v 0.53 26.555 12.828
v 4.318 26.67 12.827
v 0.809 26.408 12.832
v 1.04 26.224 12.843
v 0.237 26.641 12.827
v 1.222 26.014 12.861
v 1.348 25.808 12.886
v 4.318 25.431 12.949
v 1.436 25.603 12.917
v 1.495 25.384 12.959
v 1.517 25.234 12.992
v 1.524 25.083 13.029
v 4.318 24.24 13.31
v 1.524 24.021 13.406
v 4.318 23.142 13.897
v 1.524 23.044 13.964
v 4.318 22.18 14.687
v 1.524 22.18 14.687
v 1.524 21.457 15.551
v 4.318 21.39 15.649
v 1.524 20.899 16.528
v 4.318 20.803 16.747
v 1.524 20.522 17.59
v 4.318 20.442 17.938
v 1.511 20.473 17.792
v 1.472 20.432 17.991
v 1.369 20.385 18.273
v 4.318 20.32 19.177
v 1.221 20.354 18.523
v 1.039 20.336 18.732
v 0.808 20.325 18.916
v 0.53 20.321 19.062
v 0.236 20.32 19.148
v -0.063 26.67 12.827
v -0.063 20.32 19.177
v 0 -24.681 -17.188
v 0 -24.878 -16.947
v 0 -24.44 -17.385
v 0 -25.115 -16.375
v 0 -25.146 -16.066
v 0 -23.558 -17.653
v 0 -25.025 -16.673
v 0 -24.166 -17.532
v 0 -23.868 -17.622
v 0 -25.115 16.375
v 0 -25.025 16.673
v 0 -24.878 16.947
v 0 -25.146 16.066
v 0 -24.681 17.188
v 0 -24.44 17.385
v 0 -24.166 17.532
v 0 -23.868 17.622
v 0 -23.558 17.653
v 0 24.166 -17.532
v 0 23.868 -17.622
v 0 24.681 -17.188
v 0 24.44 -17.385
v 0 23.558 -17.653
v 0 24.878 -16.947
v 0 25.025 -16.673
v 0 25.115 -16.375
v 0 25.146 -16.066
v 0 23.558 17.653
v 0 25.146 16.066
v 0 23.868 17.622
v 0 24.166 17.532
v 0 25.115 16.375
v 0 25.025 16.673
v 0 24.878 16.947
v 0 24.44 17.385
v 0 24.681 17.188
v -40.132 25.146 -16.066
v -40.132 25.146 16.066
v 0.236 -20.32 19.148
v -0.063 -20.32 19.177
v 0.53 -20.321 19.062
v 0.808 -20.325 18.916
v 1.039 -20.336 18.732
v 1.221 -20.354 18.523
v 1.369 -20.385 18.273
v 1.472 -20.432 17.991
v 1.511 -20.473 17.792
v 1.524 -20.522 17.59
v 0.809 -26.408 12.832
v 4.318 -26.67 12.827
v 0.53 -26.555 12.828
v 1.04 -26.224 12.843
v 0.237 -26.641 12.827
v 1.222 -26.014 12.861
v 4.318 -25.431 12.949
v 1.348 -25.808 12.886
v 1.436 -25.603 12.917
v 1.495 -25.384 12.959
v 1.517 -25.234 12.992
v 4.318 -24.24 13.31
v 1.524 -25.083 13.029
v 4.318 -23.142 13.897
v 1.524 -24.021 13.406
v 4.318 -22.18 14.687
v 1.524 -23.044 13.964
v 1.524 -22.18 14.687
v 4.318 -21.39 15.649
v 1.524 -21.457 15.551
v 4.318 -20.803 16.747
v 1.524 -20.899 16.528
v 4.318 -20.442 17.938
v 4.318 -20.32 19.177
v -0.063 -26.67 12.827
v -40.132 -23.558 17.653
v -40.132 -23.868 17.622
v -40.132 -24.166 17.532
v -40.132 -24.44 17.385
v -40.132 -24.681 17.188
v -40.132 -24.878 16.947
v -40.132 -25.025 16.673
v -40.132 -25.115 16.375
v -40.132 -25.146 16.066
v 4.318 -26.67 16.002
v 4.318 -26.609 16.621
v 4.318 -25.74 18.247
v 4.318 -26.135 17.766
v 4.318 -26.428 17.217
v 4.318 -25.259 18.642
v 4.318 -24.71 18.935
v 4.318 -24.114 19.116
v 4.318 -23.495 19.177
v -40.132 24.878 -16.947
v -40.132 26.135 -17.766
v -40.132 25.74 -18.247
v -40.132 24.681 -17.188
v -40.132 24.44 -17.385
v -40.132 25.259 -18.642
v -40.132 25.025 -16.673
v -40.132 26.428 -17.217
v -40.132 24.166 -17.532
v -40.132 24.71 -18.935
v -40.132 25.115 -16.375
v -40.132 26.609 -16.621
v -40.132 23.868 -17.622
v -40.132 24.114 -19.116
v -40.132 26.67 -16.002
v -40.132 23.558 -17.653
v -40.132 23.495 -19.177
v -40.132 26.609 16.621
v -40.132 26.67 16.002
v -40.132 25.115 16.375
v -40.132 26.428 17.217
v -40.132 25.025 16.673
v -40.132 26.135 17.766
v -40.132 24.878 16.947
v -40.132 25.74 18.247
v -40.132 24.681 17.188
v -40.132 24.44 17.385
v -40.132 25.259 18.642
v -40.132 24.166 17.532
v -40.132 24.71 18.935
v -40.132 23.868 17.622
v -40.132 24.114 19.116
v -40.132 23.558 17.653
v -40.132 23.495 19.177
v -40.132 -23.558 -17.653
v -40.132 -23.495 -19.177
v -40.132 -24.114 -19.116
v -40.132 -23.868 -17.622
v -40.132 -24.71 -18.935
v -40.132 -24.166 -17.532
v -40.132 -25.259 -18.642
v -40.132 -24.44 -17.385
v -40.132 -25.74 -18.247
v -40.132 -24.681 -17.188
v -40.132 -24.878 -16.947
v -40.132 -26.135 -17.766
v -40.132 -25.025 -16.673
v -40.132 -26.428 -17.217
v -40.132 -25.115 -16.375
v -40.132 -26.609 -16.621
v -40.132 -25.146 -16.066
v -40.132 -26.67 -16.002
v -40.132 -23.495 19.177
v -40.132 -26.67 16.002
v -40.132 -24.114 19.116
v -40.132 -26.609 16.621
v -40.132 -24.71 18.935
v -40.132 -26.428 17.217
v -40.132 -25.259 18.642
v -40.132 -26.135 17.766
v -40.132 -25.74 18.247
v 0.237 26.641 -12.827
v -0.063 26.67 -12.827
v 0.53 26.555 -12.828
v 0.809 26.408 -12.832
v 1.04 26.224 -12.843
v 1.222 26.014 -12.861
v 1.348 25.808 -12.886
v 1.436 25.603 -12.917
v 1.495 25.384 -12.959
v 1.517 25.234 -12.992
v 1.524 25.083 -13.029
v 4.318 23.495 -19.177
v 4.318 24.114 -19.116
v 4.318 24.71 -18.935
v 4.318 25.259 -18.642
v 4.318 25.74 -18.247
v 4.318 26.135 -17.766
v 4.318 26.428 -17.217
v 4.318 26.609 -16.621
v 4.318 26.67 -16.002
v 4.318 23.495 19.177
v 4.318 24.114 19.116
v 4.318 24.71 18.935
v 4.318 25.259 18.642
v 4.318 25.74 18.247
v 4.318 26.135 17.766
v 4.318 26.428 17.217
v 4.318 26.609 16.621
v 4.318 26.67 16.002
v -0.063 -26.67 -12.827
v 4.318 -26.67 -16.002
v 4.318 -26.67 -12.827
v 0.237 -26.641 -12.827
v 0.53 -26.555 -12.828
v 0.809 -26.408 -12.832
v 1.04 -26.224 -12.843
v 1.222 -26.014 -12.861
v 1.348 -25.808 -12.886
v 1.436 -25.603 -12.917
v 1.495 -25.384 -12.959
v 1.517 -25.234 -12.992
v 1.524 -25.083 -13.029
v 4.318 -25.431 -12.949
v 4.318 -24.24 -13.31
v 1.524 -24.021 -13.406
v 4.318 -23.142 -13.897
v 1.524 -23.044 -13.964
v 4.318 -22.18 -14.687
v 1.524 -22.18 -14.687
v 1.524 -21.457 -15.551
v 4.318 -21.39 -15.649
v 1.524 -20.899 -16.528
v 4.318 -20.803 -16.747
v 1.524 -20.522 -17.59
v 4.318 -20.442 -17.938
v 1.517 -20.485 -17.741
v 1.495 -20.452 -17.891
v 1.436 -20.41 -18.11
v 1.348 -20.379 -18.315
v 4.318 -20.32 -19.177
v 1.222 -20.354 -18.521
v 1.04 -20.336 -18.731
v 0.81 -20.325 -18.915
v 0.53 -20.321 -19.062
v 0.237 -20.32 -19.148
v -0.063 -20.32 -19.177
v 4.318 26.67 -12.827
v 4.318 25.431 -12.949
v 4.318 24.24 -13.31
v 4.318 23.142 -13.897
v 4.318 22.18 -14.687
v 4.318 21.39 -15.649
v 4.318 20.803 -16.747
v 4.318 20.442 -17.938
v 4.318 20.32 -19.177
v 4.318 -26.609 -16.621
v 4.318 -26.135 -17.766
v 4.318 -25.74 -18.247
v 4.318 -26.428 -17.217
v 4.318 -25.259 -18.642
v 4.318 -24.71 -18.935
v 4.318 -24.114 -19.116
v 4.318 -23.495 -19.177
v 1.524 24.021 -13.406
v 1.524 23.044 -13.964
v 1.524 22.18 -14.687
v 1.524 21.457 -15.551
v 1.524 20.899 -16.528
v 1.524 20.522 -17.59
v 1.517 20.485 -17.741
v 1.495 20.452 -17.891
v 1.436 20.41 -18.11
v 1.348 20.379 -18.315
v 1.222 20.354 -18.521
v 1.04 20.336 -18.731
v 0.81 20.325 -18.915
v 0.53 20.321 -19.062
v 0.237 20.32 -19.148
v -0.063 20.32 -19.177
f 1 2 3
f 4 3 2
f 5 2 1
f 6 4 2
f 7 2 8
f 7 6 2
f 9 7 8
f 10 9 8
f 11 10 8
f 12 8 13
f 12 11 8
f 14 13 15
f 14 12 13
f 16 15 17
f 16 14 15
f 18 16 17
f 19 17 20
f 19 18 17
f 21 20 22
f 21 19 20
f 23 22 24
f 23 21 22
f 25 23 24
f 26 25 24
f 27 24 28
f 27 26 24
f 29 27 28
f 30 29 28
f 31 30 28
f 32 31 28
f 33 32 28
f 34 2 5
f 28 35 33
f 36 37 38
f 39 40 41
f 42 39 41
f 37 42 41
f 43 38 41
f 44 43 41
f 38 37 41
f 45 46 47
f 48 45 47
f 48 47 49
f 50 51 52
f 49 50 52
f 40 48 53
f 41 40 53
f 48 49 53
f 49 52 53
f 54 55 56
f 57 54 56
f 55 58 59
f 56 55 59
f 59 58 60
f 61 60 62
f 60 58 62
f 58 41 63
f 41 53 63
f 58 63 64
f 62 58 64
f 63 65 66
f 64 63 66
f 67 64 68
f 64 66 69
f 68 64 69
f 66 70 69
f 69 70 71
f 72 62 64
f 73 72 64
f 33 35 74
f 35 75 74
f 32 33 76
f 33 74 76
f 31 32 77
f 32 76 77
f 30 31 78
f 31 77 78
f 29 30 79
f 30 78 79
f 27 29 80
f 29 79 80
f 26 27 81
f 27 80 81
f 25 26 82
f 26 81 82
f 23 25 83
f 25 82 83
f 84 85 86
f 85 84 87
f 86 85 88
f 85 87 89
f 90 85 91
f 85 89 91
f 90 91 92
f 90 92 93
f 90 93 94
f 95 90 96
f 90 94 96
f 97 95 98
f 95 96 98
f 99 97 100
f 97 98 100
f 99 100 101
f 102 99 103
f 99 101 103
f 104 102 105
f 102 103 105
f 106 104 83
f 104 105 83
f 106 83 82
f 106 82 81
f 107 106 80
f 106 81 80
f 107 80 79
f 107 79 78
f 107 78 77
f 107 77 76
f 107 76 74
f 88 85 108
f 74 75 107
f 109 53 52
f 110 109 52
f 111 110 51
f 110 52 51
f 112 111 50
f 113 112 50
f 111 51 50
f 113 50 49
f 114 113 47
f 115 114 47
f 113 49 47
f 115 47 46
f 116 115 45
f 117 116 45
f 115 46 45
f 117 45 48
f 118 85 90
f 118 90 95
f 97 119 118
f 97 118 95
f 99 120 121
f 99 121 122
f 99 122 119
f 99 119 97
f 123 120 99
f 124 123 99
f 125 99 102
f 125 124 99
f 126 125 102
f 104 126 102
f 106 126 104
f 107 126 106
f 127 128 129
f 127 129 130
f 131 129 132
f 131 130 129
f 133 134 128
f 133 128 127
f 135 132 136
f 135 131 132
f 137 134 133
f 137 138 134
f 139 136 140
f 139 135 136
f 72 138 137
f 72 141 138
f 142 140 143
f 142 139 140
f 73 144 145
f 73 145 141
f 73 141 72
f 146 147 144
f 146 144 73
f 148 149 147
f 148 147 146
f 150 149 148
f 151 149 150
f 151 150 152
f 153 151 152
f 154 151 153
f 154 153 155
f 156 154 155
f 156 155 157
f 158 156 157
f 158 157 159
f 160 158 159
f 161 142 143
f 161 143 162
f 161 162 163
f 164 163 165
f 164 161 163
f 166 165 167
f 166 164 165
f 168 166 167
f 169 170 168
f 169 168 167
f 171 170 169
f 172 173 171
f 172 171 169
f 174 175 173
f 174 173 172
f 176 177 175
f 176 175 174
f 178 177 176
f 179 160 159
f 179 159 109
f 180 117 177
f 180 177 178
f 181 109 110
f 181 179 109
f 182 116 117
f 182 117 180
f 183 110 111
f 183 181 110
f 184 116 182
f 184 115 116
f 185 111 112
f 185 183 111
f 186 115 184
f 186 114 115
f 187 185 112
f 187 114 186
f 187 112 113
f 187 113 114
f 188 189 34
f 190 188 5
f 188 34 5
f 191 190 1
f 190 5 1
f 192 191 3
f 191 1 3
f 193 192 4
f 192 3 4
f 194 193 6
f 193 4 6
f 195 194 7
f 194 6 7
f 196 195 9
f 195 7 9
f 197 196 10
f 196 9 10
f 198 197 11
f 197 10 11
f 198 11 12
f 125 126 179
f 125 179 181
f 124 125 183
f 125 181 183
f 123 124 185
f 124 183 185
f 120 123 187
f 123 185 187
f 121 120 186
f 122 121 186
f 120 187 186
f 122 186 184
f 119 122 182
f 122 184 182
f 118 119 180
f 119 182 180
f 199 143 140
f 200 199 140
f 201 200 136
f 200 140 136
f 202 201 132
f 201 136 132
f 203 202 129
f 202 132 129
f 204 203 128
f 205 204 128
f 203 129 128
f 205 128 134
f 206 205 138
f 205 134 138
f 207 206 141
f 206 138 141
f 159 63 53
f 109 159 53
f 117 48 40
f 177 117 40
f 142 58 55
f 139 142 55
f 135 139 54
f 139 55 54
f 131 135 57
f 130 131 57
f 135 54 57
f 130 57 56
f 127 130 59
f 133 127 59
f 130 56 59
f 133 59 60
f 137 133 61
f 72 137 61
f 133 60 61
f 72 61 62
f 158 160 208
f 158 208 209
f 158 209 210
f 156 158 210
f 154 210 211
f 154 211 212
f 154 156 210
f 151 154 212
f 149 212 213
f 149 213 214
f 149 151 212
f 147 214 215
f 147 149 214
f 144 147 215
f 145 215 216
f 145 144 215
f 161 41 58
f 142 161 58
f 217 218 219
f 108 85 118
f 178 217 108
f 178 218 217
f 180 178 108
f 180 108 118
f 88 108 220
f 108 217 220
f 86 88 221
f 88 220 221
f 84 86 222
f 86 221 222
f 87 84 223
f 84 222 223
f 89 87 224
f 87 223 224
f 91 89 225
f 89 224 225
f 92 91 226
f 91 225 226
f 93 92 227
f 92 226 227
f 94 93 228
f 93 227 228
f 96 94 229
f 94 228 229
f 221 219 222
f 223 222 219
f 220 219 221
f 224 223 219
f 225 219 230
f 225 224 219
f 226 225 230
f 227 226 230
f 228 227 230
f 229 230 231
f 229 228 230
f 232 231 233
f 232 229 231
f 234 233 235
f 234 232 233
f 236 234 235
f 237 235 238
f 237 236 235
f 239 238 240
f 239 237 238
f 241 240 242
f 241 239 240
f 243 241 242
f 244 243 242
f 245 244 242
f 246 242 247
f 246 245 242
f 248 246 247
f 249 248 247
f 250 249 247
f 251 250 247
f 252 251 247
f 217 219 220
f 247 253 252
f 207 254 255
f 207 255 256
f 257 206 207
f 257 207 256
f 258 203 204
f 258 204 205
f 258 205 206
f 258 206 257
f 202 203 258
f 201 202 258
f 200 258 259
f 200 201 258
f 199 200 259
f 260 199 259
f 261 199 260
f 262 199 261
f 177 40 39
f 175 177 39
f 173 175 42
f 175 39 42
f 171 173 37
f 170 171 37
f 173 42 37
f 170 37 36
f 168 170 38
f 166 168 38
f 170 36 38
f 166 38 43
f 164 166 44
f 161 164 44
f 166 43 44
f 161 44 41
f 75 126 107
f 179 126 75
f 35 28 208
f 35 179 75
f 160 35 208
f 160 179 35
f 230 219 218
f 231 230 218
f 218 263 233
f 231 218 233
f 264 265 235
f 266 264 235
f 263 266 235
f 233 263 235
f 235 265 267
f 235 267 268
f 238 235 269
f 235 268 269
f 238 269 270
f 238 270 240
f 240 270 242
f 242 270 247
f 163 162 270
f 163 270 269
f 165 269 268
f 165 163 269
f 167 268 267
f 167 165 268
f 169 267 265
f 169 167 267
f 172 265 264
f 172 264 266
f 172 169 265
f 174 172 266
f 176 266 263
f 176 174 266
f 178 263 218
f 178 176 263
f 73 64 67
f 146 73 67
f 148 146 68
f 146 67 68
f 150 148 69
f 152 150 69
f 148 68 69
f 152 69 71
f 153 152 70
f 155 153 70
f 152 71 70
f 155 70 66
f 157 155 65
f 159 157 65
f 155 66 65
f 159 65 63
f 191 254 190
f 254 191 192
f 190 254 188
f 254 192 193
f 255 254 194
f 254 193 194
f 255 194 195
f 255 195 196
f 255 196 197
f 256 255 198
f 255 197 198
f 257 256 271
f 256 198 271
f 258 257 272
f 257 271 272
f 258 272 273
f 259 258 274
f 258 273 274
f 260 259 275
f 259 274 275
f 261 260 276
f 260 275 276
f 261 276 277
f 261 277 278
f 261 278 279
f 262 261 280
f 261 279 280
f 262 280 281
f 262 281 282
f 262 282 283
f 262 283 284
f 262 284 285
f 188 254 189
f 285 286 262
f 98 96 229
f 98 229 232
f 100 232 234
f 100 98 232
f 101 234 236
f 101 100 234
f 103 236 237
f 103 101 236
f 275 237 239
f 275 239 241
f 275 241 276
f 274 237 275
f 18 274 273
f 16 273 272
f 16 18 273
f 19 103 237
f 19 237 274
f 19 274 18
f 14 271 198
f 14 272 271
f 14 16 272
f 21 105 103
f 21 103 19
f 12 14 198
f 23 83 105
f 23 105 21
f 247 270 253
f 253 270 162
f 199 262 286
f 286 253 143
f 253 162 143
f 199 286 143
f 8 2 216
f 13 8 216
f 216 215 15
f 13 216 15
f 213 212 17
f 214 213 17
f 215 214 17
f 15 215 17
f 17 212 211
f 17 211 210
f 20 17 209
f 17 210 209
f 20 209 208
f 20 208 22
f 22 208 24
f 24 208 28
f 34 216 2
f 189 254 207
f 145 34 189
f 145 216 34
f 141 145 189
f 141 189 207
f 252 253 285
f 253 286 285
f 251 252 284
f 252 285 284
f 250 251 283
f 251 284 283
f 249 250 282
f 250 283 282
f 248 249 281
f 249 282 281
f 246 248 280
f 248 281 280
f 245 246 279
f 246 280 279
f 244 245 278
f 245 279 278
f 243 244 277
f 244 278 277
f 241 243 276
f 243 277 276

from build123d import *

# Parameters (mm, degrees)
F1_DEPTH = 1.524
F3_DEPTH = 40.132
F5_DEPTH = 2.794
F8_R     = 1.5875
F9_R     = 1.5875
F10_R    = 1.5875
F11_R    = 1.5875


with BuildPart() as f1:
    # F0 (on Right) → F1 (new body)
    with BuildSketch(Plane.YZ):
        with BuildLine():
            ThreePointArc((26.67, 16.002), (25.7400640303, 18.2470640303), (23.495, 19.177))
            Line((23.495, 19.177), (-23.495, 19.177))
            ThreePointArc((-23.495, 19.177), (-25.7400640303, 18.2470640303), (-26.67, 16.002))
            Line((-26.67, 16.002), (-26.67, -16.002))
            ThreePointArc((-26.67, -16.002), (-25.7400640303, -18.2470640303), (-23.495, -19.177))
            Line((-23.495, -19.177), (23.495, -19.177))
            ThreePointArc((23.495, -19.177), (25.7400640303, -18.2470640303), (26.67, -16.002))
            Line((26.67, -16.002), (26.67, 16.002))
        make_face()
    extrude(amount=F1_DEPTH)

    # F2 (on face) → F3 (join)
    with BuildSketch(Plane(origin=(0, 0, 0), x_dir=(0, -1, 0), z_dir=(-1, 0, 0))):
        with BuildLine():
            ThreePointArc((-23.495, 19.177), (-25.7400640303, 18.2470640303), (-26.67, 16.002))
            Line((-26.67, 16.002), (-26.67, -16.002))
            ThreePointArc((-26.67, -16.002), (-25.7400640303, -18.2470640303), (-23.495, -19.177))
            Line((-23.495, -19.177), (23.495, -19.177))
            ThreePointArc((23.495, -19.177), (25.7400640303, -18.2470640303), (26.67, -16.002))
            Line((26.67, -16.002), (26.67, 16.002))
            ThreePointArc((26.67, 16.002), (25.7400640303, 18.2470640303), (23.495, 19.177))
            Line((23.495, 19.177), (-23.495, 19.177))
        make_face()
        with BuildLine():
            ThreePointArc((25.146, -16.0655), (24.6810320151, -17.1880320151), (23.5585, -17.653))
            Line((23.5585, -17.653), (-23.5585, -17.653))
            ThreePointArc((-23.5585, -17.653), (-24.6810320151, -17.1880320151), (-25.146, -16.0655))
            Line((-25.146, -16.0655), (-25.146, 16.0655))
            ThreePointArc((-25.146, 16.0655), (-24.6810320151, 17.1880320151), (-23.5585, 17.653))
            Line((-23.5585, 17.653), (23.5585, 17.653))
            ThreePointArc((23.5585, 17.653), (24.6810320151, 17.1880320151), (25.146, 16.0655))
            Line((25.146, 16.0655), (25.146, -16.0655))
        make_face(mode=Mode.SUBTRACT)
    extrude(amount=F3_DEPTH)

    # F4 (on face) → F5 (join)
    with BuildSketch(Plane.YZ.offset(1.524)):
        with BuildLine():
            ThreePointArc((-26.67, 12.827), (-22.1798719395, 14.6868719395), (-20.32, 19.177))
            Line((-20.32, 19.177), (-23.495, 19.177))
            ThreePointArc((-23.495, 19.177), (-25.7400640303, 18.2470640303), (-26.67, 16.002))
            Line((-26.67, 16.002), (-26.67, 12.827))
        make_face()
    extrude(amount=F5_DEPTH)


with BuildPart() as f6_1:
    # F6: instance of F1
    add(f1.part.mirror(Plane.XY))


with BuildPart() as f1_1:
    add(f1.part)

    add(f6_1.part)  # F7 merges F6_1
    # F7: F6_1, F1 across plane
    add(f6_1.part.mirror(Plane.XZ))
    add(f1.part.mirror(Plane.XZ))

    # F8
    f8_edges = [f1_1.edges().sort_by_distance(p)[0] for p in [
        (1.524, -26.67, 0),
    ]]
    fillet(f8_edges, radius=F8_R)

    # F9
    f9_edges = [f1_1.edges().sort_by_distance(p)[0] for p in [
        (1.524, 0, -19.177),
    ]]
    fillet(f9_edges, radius=F9_R)

    # F10
    f10_edges = [f1_1.edges().sort_by_distance(p)[0] for p in [
        (1.524, 26.67, 0),
    ]]
    fillet(f10_edges, radius=F10_R)

    # F11
    f11_edges = [f1_1.edges().sort_by_distance(p)[0] for p in [
        (1.524, 0, 19.177),
    ]]
    fillet(f11_edges, radius=F11_R)


solid = f1_1.part
